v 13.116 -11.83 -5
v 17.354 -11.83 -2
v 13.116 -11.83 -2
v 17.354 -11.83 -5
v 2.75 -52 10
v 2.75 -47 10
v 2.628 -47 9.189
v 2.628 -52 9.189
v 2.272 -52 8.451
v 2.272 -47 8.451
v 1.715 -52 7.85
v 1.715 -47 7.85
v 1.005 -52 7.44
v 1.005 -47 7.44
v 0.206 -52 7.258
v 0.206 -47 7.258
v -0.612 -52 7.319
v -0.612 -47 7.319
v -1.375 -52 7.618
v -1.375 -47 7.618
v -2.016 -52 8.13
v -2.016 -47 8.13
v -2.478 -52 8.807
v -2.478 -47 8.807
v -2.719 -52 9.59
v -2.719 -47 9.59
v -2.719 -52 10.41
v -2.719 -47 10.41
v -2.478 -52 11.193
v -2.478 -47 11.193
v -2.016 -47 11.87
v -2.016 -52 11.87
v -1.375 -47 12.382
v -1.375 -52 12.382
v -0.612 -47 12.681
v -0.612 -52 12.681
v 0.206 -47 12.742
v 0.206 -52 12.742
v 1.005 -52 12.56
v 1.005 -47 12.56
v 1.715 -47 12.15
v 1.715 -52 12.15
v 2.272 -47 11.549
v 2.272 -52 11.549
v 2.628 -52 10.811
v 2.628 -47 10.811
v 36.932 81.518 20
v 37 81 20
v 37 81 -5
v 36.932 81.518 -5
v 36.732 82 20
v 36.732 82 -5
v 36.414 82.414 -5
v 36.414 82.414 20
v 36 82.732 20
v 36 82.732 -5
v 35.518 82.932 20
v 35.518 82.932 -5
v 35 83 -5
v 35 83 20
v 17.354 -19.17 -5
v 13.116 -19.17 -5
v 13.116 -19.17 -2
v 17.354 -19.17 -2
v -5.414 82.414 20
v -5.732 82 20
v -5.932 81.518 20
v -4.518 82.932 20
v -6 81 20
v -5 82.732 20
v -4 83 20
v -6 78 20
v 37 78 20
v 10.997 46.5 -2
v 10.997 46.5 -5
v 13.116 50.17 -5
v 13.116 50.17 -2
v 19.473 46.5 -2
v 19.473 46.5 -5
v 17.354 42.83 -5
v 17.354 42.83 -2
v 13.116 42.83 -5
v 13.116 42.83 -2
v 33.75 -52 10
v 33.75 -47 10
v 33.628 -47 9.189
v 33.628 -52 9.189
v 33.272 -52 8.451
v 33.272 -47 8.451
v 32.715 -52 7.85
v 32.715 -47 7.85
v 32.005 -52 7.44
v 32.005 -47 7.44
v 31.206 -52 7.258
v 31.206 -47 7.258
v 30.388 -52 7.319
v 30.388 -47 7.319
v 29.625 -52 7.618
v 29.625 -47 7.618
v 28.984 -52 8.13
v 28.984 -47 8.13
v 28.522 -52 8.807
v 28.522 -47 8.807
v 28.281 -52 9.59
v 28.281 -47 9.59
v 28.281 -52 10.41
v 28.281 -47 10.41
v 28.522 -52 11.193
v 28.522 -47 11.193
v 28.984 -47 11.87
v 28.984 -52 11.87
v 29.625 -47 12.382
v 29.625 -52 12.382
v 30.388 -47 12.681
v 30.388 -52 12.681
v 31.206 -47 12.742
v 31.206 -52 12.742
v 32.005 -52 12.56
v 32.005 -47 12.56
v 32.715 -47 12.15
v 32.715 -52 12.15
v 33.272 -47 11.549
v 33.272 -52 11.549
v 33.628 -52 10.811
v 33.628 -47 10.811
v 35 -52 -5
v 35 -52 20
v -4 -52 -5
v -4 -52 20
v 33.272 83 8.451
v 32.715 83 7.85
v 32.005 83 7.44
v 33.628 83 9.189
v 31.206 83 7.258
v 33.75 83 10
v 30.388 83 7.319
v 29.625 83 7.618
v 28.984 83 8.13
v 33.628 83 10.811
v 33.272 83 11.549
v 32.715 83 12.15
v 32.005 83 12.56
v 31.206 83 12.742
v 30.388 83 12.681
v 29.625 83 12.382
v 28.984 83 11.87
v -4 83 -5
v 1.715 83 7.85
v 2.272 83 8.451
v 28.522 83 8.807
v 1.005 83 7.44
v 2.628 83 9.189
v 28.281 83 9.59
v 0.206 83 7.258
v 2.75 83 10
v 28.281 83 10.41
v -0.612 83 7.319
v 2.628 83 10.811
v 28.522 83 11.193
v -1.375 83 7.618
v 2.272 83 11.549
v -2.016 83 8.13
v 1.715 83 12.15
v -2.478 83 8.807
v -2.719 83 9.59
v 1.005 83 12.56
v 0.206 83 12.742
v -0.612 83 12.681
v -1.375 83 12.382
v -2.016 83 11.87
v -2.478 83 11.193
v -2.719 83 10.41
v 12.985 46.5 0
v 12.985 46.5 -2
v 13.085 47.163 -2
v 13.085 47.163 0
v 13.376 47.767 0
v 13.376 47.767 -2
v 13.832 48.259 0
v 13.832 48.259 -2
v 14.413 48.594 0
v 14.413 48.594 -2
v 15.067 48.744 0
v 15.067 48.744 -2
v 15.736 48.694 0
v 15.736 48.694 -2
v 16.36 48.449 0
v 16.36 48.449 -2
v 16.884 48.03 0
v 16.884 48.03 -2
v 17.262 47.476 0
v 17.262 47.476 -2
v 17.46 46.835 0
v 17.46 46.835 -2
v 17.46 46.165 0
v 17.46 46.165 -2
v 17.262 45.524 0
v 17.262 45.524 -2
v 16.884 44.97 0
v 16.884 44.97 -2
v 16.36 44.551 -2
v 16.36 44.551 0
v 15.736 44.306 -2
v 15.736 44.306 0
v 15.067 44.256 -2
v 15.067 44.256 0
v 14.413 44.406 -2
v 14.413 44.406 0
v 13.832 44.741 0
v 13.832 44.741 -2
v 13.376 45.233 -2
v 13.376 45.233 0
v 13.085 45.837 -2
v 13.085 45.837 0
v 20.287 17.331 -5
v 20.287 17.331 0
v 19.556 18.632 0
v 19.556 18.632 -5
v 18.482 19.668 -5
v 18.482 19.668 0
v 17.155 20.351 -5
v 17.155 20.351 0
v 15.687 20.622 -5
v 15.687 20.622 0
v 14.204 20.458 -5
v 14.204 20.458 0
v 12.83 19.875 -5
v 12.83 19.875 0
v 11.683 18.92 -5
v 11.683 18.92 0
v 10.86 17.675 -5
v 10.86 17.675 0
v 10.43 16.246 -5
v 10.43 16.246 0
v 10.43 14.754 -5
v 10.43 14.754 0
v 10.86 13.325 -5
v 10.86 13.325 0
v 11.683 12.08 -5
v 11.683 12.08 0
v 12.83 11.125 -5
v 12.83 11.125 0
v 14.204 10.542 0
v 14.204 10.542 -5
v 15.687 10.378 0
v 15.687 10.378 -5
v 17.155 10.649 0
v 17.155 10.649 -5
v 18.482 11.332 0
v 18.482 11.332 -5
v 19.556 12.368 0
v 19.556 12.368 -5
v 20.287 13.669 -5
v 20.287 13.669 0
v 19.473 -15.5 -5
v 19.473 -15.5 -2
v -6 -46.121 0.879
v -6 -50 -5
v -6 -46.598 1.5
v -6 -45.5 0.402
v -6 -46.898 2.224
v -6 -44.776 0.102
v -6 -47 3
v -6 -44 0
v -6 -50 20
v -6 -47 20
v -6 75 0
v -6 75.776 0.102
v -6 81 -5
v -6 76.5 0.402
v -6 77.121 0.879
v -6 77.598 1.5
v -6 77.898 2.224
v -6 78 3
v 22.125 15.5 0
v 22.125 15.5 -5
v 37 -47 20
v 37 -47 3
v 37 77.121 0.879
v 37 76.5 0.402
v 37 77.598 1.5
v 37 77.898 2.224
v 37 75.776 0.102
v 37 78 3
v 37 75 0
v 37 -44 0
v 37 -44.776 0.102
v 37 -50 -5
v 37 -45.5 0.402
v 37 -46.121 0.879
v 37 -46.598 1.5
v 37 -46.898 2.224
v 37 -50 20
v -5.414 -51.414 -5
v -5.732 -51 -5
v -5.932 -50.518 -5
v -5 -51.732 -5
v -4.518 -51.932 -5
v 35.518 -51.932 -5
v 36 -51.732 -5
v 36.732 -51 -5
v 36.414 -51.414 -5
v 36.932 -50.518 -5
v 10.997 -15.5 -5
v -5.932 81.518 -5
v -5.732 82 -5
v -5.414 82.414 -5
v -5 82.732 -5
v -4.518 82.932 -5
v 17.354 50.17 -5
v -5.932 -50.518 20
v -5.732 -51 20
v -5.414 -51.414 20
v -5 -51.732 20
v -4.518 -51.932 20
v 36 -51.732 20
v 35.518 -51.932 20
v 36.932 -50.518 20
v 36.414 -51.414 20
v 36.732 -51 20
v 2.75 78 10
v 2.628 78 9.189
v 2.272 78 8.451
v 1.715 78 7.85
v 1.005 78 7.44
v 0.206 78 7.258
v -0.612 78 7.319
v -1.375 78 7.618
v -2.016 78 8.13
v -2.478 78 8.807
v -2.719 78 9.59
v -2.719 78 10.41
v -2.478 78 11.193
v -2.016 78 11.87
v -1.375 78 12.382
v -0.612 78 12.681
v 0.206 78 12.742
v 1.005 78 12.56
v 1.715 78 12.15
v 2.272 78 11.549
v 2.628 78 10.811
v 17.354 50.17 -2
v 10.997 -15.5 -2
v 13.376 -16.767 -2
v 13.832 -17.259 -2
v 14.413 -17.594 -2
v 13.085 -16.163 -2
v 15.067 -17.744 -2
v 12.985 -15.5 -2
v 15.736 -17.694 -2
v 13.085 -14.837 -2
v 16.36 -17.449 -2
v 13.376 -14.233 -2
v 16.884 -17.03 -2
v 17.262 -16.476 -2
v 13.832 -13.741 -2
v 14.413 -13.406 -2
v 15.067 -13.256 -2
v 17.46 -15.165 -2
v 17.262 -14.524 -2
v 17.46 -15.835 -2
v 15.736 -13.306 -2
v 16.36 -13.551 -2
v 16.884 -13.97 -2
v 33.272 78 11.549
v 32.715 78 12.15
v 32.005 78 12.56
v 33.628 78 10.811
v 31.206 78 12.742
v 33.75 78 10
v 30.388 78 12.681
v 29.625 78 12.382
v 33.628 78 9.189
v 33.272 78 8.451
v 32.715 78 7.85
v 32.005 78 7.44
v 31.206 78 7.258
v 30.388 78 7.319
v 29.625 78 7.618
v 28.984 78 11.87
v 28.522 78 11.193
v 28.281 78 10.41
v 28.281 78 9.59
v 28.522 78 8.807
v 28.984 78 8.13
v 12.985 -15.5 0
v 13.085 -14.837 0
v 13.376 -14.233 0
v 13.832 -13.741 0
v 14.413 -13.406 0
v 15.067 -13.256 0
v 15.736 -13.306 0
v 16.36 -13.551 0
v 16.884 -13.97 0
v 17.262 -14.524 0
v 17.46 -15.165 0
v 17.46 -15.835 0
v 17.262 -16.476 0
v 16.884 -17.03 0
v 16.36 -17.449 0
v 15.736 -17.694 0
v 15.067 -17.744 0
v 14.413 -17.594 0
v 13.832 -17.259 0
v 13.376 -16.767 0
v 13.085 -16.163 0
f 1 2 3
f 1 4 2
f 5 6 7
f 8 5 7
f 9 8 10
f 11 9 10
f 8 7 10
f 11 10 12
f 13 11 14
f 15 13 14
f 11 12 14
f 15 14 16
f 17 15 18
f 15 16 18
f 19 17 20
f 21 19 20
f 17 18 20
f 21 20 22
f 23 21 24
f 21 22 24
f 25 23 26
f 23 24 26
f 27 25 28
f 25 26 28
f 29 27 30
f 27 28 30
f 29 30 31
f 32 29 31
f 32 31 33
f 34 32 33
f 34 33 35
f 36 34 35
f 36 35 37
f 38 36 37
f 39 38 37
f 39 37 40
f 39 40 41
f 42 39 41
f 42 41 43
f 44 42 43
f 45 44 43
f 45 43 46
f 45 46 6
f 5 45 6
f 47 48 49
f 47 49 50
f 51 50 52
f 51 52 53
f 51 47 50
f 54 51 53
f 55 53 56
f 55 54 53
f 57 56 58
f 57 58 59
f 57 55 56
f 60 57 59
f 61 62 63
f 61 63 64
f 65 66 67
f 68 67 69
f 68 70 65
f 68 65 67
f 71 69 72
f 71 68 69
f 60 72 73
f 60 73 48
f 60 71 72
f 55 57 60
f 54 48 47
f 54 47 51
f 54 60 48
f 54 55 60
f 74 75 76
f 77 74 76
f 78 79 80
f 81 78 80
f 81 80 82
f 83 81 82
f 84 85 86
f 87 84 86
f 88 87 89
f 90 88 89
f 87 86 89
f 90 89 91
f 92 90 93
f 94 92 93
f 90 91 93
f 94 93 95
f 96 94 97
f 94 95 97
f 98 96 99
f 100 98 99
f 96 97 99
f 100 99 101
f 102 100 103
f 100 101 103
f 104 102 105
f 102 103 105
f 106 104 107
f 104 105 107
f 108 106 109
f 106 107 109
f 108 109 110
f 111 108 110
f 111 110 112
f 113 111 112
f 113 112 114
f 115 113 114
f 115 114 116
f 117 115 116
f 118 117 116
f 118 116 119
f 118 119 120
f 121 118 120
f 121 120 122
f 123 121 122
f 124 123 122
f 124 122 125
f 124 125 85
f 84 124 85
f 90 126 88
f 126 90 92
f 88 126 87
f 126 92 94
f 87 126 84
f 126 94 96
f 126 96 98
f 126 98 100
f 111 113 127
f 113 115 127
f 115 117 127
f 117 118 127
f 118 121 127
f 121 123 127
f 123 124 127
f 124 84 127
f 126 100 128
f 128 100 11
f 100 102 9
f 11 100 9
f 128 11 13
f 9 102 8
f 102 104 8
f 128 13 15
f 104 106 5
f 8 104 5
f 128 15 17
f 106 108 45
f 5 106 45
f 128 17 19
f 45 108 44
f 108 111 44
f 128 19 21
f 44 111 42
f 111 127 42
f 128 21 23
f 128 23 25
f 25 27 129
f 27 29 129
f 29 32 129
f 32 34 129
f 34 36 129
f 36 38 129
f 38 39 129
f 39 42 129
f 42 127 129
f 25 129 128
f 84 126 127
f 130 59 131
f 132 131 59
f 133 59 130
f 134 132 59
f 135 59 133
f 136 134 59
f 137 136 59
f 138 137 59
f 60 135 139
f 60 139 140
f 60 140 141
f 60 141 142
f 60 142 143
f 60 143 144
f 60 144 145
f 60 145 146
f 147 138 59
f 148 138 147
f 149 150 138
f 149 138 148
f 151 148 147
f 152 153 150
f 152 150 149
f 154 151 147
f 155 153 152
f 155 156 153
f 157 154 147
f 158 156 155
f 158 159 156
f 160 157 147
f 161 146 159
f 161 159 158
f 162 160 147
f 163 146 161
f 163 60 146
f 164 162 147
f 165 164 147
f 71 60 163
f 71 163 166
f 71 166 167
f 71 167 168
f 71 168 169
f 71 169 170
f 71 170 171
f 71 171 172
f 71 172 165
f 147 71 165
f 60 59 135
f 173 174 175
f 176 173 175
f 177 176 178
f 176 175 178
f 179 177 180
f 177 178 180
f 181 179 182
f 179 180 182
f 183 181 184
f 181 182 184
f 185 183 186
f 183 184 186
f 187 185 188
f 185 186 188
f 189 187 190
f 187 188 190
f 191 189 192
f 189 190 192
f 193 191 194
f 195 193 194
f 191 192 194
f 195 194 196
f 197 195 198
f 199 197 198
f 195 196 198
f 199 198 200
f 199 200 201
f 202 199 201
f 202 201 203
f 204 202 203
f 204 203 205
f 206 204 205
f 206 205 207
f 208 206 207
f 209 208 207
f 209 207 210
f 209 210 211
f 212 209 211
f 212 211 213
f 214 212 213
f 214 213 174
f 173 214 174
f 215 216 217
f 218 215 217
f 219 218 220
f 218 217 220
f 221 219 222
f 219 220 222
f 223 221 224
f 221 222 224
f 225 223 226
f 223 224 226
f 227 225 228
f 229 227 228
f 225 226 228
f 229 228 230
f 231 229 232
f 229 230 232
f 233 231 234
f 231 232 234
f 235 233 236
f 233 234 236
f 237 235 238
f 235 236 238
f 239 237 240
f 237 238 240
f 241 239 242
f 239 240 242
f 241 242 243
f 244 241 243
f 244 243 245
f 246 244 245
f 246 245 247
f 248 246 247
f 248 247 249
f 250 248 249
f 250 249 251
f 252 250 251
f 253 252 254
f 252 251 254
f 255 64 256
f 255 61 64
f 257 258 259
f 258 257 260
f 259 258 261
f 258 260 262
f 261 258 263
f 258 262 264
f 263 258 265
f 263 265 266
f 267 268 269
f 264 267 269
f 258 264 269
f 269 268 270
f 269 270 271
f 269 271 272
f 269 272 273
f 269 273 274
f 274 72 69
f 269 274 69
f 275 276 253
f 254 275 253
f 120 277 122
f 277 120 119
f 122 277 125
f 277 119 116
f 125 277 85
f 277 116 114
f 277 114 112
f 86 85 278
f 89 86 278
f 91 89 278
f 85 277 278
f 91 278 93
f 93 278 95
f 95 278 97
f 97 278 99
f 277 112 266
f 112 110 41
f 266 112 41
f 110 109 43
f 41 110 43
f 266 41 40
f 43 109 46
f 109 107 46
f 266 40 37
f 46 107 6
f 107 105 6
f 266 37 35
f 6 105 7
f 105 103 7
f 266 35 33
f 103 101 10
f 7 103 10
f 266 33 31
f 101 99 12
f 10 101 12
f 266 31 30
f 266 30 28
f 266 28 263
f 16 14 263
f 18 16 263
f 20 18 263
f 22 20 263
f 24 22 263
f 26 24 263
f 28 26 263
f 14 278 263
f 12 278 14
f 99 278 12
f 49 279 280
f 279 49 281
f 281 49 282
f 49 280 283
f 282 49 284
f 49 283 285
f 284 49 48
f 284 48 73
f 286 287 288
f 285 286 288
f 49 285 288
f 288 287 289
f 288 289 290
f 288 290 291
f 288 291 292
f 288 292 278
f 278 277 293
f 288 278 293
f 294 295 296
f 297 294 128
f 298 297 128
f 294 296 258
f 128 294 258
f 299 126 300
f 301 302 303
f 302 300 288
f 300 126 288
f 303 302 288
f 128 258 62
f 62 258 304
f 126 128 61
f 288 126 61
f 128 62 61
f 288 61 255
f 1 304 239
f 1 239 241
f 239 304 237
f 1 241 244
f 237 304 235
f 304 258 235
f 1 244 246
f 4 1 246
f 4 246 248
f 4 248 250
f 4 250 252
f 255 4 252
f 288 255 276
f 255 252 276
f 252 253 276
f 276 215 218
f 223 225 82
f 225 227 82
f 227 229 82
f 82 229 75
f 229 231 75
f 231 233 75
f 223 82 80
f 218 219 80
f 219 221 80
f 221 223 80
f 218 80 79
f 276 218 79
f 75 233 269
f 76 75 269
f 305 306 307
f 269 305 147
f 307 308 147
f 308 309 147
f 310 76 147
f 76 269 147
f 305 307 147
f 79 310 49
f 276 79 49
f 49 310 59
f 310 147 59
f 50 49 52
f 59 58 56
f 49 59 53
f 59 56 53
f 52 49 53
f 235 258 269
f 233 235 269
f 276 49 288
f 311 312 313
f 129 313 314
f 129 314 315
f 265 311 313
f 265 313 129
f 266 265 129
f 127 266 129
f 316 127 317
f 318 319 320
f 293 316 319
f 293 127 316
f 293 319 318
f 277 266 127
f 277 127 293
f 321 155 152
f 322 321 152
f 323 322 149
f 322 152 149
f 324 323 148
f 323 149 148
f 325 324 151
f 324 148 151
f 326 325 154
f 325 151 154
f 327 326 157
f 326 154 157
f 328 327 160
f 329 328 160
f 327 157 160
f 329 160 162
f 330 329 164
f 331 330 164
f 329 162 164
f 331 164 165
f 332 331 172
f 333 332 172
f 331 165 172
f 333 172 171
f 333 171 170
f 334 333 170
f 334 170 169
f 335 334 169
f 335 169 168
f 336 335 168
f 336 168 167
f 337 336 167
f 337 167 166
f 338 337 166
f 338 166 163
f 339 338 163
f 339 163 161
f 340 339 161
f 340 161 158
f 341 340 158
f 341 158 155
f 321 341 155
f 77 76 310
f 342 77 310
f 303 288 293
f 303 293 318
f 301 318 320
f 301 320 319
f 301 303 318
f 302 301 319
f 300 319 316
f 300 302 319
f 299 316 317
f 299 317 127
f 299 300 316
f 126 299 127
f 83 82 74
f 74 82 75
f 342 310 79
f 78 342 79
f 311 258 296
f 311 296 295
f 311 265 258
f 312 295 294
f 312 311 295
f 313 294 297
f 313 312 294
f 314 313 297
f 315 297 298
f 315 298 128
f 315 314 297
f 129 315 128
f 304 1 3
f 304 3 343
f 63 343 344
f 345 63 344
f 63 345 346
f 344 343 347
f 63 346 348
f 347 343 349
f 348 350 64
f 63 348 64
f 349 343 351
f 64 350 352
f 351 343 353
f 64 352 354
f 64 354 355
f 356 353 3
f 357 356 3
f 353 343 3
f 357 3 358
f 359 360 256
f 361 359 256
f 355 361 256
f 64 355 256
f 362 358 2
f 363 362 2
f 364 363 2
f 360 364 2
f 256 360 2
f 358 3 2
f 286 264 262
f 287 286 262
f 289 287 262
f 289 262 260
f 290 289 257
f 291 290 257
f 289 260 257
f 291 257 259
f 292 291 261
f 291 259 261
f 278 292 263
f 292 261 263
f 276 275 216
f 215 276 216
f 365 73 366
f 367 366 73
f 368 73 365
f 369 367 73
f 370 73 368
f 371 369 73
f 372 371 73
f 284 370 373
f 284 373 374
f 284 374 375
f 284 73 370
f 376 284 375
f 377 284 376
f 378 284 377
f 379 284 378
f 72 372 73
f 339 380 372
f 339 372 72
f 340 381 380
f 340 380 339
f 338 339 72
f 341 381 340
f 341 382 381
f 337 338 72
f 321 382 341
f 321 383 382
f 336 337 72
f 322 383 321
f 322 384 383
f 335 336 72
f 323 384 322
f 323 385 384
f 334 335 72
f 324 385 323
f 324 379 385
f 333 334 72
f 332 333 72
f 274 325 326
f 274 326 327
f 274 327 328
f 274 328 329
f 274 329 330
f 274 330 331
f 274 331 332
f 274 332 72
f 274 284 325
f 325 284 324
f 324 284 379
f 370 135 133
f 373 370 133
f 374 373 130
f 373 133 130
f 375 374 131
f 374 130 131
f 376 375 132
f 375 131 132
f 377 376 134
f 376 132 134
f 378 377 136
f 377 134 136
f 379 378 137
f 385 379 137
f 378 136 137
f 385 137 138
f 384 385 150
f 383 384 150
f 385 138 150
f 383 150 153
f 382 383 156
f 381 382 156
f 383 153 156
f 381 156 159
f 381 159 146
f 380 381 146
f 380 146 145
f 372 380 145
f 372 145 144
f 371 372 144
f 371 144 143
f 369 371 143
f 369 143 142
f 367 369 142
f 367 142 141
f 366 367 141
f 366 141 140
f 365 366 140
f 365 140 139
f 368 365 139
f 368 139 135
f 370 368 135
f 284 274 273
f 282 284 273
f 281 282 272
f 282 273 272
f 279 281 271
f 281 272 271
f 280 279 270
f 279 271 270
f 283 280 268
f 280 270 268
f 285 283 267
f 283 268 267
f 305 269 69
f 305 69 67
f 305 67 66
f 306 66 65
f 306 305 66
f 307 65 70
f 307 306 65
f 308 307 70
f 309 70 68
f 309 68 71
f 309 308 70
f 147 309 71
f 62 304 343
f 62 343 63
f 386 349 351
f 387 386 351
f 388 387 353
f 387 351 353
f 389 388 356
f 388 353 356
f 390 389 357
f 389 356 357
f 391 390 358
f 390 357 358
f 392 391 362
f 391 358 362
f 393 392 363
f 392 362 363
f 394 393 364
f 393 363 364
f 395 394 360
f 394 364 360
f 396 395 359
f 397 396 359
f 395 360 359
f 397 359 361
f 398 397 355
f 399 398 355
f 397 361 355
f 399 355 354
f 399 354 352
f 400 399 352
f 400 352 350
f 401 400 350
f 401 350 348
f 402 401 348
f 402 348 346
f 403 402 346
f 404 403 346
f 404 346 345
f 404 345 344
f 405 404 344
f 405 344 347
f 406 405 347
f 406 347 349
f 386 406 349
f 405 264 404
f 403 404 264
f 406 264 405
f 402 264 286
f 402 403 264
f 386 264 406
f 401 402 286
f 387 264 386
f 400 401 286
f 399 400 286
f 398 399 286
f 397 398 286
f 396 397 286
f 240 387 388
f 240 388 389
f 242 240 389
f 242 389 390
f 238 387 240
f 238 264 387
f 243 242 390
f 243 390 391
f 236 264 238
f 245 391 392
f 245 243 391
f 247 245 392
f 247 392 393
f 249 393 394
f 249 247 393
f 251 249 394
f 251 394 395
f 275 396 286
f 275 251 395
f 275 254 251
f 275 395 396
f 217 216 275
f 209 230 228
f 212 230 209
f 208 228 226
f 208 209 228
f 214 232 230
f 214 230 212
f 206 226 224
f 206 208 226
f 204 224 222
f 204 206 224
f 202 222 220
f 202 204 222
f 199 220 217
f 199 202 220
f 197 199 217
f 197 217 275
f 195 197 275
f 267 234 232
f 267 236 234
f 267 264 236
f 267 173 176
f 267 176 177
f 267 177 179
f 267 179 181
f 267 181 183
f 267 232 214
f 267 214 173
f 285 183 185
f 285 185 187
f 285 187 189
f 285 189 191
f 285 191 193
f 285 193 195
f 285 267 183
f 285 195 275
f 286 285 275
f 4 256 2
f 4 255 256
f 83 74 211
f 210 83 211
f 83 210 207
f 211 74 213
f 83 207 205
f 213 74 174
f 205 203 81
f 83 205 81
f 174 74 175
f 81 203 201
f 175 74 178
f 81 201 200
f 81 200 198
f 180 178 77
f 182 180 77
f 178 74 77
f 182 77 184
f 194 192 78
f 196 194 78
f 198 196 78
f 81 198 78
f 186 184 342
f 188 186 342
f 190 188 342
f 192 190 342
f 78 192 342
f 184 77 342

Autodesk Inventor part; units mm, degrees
ref_plane "YZ Plane" through (0, 0, 0) normal (1, 0, 0) x (0, 1, 0)
ref_plane "XZ Plane" through (0, 0, 0) normal (0, 1, 0) x (-1, 0, 0)
ref_plane "XY Plane" through (0, 0, 0) normal (0, 0, 1) x (1, 0, 0)
sketch "Sketch1" plane through (0, 0, 0) normal (0, 0, 1) x (1, 0, 0)
  circle A0 centre (0, 0) radius 2.25
  circle A1 centre (31, 0) radius 2.25
  circle A2 centre (0, 31) radius 2.25
  circle A3 centre (31, 31) radius 2.25
  circle A4 centre (15.5, 15.5) radius 5.125
  line L0 (-6, 37) -> (37, 37)
  line L1 (37, 37) -> (37, -6)
  line L2 (37, -6) -> (-6, -6)
  line L3 (-6, -6) -> (-6, 37)
  line L4 (-6, 37) -> (37, -6) construction
  line L5 (37, 37) -> (-6, -6) construction
  line L6 (-6, -6) -> (37, -6)
  line L7 (37, -6) -> (37, -52)
  line L8 (37, -52) -> (-6, -52)
  line L9 (-6, -52) -> (-6, -6)
  line L10 (-6, 15.5) -> (0, 15.5)
  line L11 (37, 37) -> (37, 83)
  line L12 (37, 83) -> (-6, 83)
  line L13 (-6, 83) -> (-6, 37)
  line L14 (20.625, 15.5) -> (22.125, 15.5)
  line L15 (22.125, 15.5) -> (20.2868, 17.3309)
  line L16 (22.125, 15.5) -> (20.2868, 13.6691)
  point P0 (37, 37)
  dimension "d3" = 4.5
  dimension "d5" = 31
  dimension "d6" = 10.25
  dimension "d7" = 43
  dimension "d8" = 43
  dimension "d9" = 67.5
  dimension "d10" = 31
  dimension "d44" = 1.5
extrude "Extrusion1" add sketch "Sketch1" against normal blind 5 contours A0 | A1 | A2 | A3 | L13 L12 L11 L0 | L0 L1 L2 L3 | L7 L8 L9 L2
sketch "Sketch2" plane through (0, 0, 0) normal (0, 0, 1) x (1, 0, 0)
  line L0 (37, -52) -> (-6, -52) projected
  line L1 (37, 83) -> (37, -52) projected
  line L2 (-6, -52) -> (37, -52)
  line L3 (37, -52) -> (37, -47)
  line L4 (37, -47) -> (-6, -47)
  line L5 (-6, -47) -> (-6, -52)
  line L6 (-6, 15.5) -> (0, 15.5) projected
  line L7 (37, 78) -> (-6, 78)
  line L8 (-6, 78) -> (37, 78)
  line L9 (-6, 83) -> (-6, -52) projected
  line L10 (-6, -52) -> (37, -52) projected
  line L11 (37, -52) -> (37, 83) projected
  line L12 (37, 83) -> (-6, 83) projected
  arc A0 (20.2868, 17.3309) -> (20.2868, 13.6691) centre (15.5, 15.5) ccw projected
  line L13 (22.125, 15.5) -> (20.2868, 13.6691) projected
  line L14 (20.2868, 17.3309) -> (22.125, 15.5) projected
  point P0 (0, 0)
  point P1 (37, 37)
  point P2 (-6, 37)
  point P3 (-6, 78)
  point P4 (37, 78)
  dimension "d13" = 5
extrude "Extrusion2" add sketch "Sketch2" along normal blind 20 contours L0 L5 L4 L1 | L7 L9 L12 L1
sketch "Sketch3" plane through (-6, -47, 0) normal (0, 1, 0) x (1, 0, 0)
  circle A0 centre (6, -10) radius 2.75
  circle A1 centre (37, -10) radius 2.75
  line L0 (0, 5) -> (0, -20) projected
  line L1 (0, 0) -> (0, -20) projected
  line L2 (43, 0) -> (43, -20) projected
  line L3 (0, 5) -> (43, 5) projected
  line L4 (0, 0) -> (43, 0) projected
  line L5 (43, 5) -> (0, 5) projected
  line L6 (6, -10) -> (6, -15) construction
  arc A2 (8.75, -10) -> (3.25, -10) centre (6, -10) ccw
  line L7 (21.5, 0) -> (21.5, -10)
  arc A3 (39.75, -10) -> (34.25, -10) centre (37, -10) ccw
  line L8 (6, -10) -> (6, -5) construction
  line L9 (3.25, -10) -> (3.25, -5)
  line L10 (8.75, -5) -> (8.75, -10)
  arc A4 (3.25, -10) -> (8.75, -10) centre (6, -10) ccw
  arc A5 (8.75, -5) -> (3.25, -5) centre (6, -5) ccw
  line L11 (37, -10) -> (37, -5) construction
  line L12 (39.75, -10) -> (39.75, -5)
  line L13 (34.25, -5) -> (34.25, -10)
  arc A6 (39.75, -5) -> (34.25, -5) centre (37, -5) ccw
  point P0 (6, 0)
  point P1 (0, -10)
  point P2 (6, -12.5)
  point P3 (6, -7.5)
  point P4 (39.75, -10)
  point P5 (3.25, -10)
  dimension "d16" = 5.5
  dimension "d17" = 31
  dimension "d23" = 6
  dimension "d38" = 15
  dimension "d39" = 5
  dimension "d43" = 5
extrude "Extrusion3" [suppressed]
sketch "Sketch8" plane through (-6, 83, 0) normal (0, -1, 0) x (1, 0, 0)
  circle A0 centre (6, 10) radius 2.75 projected
  circle A1 centre (37, 10) radius 2.75 projected
  point P0 (6, 0)
extrude "Extrusion8" cut sketch "Sketch8" along normal blind 160.5
fillet "Fillet2" [suppressed]
sketch "Sketch9" plane through (0, 0, -5) normal (0, 0, -1) x (-1, 0, 0)
  circle A0 centre (-15.235, 46.5) radius 2.25
  circle A1 centre (-15.235, -15.5) radius 2.25
  line L0 (-37, 83) -> (-37, -52) projected
  line L1 (-37, -52) -> (6, -52) projected
  line L2 (6, -52) -> (6, 83) projected
  line L3 (6, 83) -> (-37, 83) projected
  arc A2 (-20.2868, 13.6691) -> (-20.2868, 17.3309) centre (-15.5, 15.5) ccw projected
  line L4 (-20.2868, 13.6691) -> (-22.125, 15.5) projected
  line L5 (-22.125, 15.5) -> (-20.2868, 17.3309) projected
  point P0 (0, 0)
  dimension "d45" = 62
  dimension "d46" = 31
  dimension "d49" = 4.5
extrude "Extrusion9" cut sketch "Sketch9" against normal blind 10 contours A0 | A1
sketch "Sketch10" plane through (0, 0, -5) normal (0, 0, 1) x (1, 0, 0)
  circle A0 centre (15.235, -15.5) radius 2.25 projected
  circle A1 centre (15.235, 46.5) radius 2.25 projected
  line L0 (-6, -47) -> (37, -47) projected
  line L1 (37, -47) -> (37, 78) projected
  line L2 (37, 78) -> (-6, 78) projected
  line L3 (-6, 78) -> (-6, -47) projected
  arc A2 (20.2868, 17.3309) -> (20.2868, 13.6691) centre (15.5, 15.5) ccw projected
  line L4 (11.286, 46.5) -> (13.2605, 49.92)
  line L5 (13.2605, 49.92) -> (17.2096, 49.92)
  line L6 (17.2096, 49.92) -> (19.1841, 46.5)
  line L7 (19.1841, 46.5) -> (17.2096, 43.08)
  line L8 (17.2096, 43.08) -> (13.2605, 43.08)
  line L9 (13.2605, 43.08) -> (11.286, 46.5)
  line L10 (10.9973, 46.5) -> (13.1162, 50.17)
  line L11 (13.1162, 50.17) -> (17.3539, 50.17)
  line L12 (17.3539, 50.17) -> (19.4728, 46.5)
  line L13 (19.4728, 46.5) -> (17.3539, 42.83)
  line L14 (17.3539, 42.83) -> (13.1162, 42.83)
  line L15 (13.1162, 42.83) -> (10.9973, 46.5)
  line L16 (15.5, 15.5) -> (12.1559, 15.5)
  circle A3 centre (15.235, -15.5) radius 2.25
  line L17 (11.286, -15.5) -> (13.2605, -18.92)
  line L18 (13.2605, -18.92) -> (17.2096, -18.92)
  line L19 (17.2096, -18.92) -> (19.1841, -15.5)
  line L20 (19.1841, -15.5) -> (17.2096, -12.08)
  line L21 (17.2096, -12.08) -> (13.2605, -12.08)
  line L22 (13.2605, -12.08) -> (11.286, -15.5)
  line L23 (10.9973, -15.5) -> (13.1162, -19.17)
  line L24 (13.1162, -19.17) -> (17.3539, -19.17)
  line L25 (17.3539, -19.17) -> (19.4728, -15.5)
  line L26 (19.4728, -15.5) -> (17.3539, -11.83)
  line L27 (17.3539, -11.83) -> (13.1162, -11.83)
  line L28 (13.1162, -11.83) -> (10.9973, -15.5)
  line L29 (22.125, 15.5) -> (20.2868, 13.6691) projected
  line L30 (20.2868, 17.3309) -> (22.125, 15.5) projected
  point P0 (0, 0)
  dimension "d50" = 6.84
  dimension "d51" = 0.25
extrude "M4_hex_neg" cut sketch "Sketch10" along normal blind 3 contours A0 | A1 | L4 L5 L6 L7 L8 L9 | L10 L11 L12 L13 L14 L15 | L22 L21 L20 L19 L18 L17 | L28 L27 L26 L25 L24 L23
fillet "Fillet3" radius 3 2 edges at (15.5, 78, 0) (15.5, -47, 0)
fillet "Fillet4" radius 2 4 edges at (37, -52, 7.5) (37, 83, 7.5) (-6, 83, 7.5) (-6, -52, 7.5)
properties part number "motor_holder"
